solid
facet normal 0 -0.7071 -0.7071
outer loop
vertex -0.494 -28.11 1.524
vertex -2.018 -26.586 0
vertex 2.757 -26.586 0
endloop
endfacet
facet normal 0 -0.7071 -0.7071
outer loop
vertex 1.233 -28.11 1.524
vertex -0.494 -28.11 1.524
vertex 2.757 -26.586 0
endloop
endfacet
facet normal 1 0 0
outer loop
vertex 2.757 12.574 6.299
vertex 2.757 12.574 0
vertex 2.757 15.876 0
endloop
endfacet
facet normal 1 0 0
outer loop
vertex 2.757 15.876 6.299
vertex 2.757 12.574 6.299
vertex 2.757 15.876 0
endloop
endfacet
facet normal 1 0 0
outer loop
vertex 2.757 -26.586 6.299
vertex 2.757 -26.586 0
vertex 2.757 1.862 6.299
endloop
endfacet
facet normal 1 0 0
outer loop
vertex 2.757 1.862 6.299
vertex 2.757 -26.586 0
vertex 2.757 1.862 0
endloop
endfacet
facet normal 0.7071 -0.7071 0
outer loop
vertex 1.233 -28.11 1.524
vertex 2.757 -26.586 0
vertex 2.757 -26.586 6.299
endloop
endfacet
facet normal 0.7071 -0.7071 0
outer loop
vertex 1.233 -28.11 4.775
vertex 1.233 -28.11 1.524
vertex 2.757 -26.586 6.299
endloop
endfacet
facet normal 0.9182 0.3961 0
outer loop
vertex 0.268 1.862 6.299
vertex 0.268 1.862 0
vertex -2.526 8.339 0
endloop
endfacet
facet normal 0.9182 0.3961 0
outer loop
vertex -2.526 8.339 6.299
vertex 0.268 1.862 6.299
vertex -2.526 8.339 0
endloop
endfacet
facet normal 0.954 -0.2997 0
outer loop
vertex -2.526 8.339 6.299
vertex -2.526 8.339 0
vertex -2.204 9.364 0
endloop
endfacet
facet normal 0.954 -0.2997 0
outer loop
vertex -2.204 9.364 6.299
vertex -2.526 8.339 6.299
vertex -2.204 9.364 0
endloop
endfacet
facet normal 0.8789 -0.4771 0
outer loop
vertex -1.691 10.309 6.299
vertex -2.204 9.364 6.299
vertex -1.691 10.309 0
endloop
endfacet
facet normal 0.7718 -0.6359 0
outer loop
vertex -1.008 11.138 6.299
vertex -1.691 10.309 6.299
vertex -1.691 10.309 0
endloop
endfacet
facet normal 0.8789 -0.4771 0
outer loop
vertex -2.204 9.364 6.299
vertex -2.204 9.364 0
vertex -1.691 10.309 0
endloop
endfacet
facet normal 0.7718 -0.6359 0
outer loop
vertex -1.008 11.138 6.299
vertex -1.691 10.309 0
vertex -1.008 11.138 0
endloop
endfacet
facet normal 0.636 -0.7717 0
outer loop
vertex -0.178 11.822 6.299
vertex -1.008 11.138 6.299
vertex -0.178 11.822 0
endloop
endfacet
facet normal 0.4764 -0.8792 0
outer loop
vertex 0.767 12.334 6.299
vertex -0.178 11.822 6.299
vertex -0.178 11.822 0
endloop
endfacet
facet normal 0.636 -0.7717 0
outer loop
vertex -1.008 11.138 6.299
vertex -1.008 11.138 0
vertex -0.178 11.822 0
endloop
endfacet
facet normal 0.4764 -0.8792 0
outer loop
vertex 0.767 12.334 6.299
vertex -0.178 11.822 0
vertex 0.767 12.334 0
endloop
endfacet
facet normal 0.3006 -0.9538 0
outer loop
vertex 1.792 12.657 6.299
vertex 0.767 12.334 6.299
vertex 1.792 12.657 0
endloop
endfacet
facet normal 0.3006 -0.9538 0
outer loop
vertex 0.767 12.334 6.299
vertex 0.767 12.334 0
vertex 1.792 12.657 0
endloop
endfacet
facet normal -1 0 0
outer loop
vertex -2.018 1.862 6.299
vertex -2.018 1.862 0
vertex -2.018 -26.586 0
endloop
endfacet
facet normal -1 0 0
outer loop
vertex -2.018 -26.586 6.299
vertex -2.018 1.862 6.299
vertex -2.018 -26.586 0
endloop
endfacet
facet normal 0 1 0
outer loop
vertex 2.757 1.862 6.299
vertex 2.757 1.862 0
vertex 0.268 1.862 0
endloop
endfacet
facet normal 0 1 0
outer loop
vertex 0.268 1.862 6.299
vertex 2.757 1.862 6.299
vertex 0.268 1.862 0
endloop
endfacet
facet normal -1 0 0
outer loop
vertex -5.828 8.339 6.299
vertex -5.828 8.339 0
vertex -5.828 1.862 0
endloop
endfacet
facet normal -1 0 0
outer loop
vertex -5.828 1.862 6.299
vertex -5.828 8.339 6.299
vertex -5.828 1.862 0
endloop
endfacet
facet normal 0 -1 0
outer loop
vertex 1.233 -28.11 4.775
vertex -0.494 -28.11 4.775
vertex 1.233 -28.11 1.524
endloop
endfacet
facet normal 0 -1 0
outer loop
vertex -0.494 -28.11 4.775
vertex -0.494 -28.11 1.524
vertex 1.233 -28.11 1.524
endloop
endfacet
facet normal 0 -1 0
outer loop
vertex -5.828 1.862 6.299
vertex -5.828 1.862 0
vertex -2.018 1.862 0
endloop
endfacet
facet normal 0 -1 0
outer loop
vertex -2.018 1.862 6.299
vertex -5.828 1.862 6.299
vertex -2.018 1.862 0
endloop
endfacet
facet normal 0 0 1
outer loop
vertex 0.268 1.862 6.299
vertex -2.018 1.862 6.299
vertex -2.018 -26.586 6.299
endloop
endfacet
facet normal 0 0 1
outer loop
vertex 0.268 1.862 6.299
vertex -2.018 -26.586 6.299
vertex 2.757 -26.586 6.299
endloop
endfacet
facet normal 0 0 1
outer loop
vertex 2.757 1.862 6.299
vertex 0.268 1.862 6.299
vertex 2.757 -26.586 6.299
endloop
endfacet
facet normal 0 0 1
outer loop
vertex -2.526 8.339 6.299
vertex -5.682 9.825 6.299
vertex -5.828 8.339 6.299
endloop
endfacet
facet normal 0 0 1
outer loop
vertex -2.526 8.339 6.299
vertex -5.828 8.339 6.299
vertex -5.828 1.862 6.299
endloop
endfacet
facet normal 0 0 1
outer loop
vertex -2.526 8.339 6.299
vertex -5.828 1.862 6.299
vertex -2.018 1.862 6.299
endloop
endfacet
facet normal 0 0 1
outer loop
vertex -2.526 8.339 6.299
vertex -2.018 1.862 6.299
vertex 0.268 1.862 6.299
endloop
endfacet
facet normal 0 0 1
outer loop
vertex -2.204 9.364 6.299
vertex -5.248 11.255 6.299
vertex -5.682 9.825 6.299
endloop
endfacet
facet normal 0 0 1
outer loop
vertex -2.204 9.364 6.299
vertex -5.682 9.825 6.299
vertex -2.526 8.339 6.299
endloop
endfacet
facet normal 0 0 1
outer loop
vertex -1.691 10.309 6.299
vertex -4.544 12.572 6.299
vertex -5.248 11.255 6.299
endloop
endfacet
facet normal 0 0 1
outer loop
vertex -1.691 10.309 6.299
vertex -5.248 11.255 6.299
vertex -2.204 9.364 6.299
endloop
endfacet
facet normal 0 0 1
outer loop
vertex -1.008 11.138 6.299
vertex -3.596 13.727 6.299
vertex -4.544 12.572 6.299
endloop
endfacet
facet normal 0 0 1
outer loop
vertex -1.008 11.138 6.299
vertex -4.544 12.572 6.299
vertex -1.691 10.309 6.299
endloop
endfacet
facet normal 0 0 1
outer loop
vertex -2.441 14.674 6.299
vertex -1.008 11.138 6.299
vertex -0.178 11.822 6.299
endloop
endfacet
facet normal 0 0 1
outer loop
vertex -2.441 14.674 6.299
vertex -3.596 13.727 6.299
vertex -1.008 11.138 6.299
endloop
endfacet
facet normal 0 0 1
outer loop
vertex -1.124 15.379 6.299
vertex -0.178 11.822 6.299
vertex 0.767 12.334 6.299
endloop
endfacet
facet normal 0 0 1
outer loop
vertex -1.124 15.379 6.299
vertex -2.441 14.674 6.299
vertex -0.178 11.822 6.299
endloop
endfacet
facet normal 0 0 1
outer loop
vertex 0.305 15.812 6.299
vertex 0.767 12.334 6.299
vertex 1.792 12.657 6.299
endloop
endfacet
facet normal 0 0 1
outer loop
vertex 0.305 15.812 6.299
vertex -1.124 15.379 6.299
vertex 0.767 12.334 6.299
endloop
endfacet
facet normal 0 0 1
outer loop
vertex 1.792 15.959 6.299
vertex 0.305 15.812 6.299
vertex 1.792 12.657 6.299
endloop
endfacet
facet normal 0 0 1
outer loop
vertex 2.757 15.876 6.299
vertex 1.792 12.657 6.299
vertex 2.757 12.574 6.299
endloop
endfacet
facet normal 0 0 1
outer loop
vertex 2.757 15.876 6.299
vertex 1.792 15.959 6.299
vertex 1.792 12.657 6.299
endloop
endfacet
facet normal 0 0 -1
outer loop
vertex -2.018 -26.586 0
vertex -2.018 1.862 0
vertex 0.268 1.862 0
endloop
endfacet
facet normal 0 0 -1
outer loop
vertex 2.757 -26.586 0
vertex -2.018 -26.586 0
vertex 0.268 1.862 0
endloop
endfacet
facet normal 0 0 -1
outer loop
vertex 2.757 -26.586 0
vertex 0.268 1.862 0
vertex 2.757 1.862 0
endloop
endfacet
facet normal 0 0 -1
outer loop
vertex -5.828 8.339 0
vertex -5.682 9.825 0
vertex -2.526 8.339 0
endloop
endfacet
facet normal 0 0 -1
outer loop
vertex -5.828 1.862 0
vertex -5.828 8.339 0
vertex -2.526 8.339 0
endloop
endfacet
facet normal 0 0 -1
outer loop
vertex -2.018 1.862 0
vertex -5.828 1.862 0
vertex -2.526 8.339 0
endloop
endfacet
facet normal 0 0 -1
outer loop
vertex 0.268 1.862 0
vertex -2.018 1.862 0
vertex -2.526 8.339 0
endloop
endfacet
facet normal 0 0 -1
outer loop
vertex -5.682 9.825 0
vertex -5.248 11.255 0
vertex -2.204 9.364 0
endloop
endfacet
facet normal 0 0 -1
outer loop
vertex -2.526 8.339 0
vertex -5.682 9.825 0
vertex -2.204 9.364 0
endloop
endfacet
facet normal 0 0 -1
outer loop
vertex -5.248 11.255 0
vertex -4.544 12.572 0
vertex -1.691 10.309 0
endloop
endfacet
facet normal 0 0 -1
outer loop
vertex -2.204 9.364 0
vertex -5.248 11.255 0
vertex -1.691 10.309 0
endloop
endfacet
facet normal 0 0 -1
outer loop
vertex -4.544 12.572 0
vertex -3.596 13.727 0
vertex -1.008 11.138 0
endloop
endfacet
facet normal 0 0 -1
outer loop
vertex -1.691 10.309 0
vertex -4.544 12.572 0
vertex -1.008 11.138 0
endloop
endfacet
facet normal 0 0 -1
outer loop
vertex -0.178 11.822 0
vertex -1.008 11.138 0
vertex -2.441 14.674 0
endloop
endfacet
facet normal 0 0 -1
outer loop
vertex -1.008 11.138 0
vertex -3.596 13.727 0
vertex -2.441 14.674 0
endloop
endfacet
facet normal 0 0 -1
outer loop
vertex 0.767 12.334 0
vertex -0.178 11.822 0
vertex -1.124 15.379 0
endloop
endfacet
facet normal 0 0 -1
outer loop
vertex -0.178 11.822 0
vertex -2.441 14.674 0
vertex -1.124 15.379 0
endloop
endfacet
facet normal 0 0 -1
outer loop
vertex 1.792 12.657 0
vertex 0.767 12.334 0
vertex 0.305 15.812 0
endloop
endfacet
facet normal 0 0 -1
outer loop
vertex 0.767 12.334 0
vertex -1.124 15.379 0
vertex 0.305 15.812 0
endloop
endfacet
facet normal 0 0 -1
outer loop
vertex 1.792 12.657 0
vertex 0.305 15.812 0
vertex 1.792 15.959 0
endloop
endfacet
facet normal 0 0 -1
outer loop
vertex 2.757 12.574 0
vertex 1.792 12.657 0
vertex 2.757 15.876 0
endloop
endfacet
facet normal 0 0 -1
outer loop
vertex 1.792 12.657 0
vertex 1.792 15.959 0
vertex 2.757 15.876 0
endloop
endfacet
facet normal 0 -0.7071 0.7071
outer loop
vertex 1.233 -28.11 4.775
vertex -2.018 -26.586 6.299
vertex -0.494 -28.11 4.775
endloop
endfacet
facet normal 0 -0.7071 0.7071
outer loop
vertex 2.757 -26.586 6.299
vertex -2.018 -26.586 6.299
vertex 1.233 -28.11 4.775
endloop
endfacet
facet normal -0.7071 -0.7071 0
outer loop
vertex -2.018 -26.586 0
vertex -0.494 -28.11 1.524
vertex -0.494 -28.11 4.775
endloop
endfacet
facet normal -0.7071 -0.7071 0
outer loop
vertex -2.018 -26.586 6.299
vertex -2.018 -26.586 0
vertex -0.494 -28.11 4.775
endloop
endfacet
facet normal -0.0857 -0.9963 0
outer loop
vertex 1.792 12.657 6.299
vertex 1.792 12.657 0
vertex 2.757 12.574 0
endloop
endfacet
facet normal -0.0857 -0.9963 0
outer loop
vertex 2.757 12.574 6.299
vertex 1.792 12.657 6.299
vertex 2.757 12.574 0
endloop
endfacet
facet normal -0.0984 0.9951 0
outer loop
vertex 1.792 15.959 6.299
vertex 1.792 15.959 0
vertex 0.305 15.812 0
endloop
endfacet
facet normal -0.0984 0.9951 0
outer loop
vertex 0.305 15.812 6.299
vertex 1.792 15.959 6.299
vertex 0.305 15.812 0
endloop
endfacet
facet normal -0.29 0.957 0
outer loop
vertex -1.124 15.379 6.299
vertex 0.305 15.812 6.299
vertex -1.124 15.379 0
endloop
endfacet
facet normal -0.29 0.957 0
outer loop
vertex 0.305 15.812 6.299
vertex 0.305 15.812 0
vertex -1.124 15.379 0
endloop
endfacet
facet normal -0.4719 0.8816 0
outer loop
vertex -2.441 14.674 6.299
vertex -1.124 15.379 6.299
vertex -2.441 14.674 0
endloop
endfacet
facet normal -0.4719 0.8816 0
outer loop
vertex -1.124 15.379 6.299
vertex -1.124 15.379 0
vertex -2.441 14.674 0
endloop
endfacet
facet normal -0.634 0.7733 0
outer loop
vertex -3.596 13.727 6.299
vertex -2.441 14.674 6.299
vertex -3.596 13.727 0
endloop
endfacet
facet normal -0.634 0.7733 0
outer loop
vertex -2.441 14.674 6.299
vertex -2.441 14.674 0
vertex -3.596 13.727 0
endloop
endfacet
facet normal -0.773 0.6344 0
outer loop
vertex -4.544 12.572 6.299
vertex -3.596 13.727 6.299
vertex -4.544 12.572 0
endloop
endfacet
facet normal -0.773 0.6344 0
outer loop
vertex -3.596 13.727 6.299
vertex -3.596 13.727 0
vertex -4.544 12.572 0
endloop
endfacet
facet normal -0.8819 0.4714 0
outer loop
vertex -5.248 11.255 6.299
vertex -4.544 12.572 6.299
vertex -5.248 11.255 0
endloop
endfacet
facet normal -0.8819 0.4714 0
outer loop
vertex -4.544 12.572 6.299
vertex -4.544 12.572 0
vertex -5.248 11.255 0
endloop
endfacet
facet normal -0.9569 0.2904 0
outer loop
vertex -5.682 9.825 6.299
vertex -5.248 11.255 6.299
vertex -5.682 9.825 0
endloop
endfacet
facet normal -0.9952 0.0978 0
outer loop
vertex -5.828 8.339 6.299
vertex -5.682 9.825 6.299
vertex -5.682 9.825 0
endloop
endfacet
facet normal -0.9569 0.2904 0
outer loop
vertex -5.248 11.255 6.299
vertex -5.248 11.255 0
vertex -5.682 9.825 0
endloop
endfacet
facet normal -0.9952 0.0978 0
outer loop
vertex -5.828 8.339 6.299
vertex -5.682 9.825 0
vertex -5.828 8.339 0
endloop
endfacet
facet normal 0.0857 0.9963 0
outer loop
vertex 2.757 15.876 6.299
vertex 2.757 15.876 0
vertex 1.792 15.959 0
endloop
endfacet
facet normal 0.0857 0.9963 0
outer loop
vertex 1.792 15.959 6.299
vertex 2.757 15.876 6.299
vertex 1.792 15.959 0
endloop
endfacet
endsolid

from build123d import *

# Parameters (mm, degrees)
F1_DEPTH = 6.2992
F2_SIZE  = 1.524


with BuildPart() as f1:
    # F0 (on Top) → F1 (new body)
    with BuildSketch(Plane.XY):
        with BuildLine():
            Line((-2.018026, 1.86154), (-2.018026, -28.11046))
            Line((-2.018026, -28.11046), (1.791974, -28.11046))
            Line((1.791974, -28.11046), (2.757174, -28.11046))
            Line((2.757174, -28.11046), (2.757174, 1.86154))
            Line((2.757174, 1.86154), (1.791974, 1.86154))
            Line((1.791974, 1.86154), (0.267974, 1.86154))
            Line((0.267974, 1.86154), (-2.526026, 8.33854))
            ThreePointArc((-2.526026, 8.33854), (-1.007509, 11.138022), (1.791974, 12.65654))
            Line((1.791974, 12.65654), (2.757174, 12.573544))
            Line((2.757174, 12.573544), (2.757174, 15.875544))
            Line((2.757174, 15.875544), (1.791974, 15.95854))
            ThreePointArc((1.791974, 15.95854), (-3.59618, 13.726694), (-5.828026, 8.33854))
            Line((-5.828026, 8.33854), (-5.828026, 1.86154))
            Line((-5.828026, 1.86154), (-2.018026, 1.86154))
        make_face()
    extrude(amount=F1_DEPTH)

    # F2
    f2_edges = [f1.edges().sort_by_distance(p)[0] for p in [
        (0.369574, -28.11046, 6.2992),
        (-2.018026, -28.11046, 3.1496),
        (2.757174, -28.11046, 3.1496),
        (0.369574, -28.11046, 0),
    ]]
    chamfer(f2_edges, length=F2_SIZE)


solid = f1.part
